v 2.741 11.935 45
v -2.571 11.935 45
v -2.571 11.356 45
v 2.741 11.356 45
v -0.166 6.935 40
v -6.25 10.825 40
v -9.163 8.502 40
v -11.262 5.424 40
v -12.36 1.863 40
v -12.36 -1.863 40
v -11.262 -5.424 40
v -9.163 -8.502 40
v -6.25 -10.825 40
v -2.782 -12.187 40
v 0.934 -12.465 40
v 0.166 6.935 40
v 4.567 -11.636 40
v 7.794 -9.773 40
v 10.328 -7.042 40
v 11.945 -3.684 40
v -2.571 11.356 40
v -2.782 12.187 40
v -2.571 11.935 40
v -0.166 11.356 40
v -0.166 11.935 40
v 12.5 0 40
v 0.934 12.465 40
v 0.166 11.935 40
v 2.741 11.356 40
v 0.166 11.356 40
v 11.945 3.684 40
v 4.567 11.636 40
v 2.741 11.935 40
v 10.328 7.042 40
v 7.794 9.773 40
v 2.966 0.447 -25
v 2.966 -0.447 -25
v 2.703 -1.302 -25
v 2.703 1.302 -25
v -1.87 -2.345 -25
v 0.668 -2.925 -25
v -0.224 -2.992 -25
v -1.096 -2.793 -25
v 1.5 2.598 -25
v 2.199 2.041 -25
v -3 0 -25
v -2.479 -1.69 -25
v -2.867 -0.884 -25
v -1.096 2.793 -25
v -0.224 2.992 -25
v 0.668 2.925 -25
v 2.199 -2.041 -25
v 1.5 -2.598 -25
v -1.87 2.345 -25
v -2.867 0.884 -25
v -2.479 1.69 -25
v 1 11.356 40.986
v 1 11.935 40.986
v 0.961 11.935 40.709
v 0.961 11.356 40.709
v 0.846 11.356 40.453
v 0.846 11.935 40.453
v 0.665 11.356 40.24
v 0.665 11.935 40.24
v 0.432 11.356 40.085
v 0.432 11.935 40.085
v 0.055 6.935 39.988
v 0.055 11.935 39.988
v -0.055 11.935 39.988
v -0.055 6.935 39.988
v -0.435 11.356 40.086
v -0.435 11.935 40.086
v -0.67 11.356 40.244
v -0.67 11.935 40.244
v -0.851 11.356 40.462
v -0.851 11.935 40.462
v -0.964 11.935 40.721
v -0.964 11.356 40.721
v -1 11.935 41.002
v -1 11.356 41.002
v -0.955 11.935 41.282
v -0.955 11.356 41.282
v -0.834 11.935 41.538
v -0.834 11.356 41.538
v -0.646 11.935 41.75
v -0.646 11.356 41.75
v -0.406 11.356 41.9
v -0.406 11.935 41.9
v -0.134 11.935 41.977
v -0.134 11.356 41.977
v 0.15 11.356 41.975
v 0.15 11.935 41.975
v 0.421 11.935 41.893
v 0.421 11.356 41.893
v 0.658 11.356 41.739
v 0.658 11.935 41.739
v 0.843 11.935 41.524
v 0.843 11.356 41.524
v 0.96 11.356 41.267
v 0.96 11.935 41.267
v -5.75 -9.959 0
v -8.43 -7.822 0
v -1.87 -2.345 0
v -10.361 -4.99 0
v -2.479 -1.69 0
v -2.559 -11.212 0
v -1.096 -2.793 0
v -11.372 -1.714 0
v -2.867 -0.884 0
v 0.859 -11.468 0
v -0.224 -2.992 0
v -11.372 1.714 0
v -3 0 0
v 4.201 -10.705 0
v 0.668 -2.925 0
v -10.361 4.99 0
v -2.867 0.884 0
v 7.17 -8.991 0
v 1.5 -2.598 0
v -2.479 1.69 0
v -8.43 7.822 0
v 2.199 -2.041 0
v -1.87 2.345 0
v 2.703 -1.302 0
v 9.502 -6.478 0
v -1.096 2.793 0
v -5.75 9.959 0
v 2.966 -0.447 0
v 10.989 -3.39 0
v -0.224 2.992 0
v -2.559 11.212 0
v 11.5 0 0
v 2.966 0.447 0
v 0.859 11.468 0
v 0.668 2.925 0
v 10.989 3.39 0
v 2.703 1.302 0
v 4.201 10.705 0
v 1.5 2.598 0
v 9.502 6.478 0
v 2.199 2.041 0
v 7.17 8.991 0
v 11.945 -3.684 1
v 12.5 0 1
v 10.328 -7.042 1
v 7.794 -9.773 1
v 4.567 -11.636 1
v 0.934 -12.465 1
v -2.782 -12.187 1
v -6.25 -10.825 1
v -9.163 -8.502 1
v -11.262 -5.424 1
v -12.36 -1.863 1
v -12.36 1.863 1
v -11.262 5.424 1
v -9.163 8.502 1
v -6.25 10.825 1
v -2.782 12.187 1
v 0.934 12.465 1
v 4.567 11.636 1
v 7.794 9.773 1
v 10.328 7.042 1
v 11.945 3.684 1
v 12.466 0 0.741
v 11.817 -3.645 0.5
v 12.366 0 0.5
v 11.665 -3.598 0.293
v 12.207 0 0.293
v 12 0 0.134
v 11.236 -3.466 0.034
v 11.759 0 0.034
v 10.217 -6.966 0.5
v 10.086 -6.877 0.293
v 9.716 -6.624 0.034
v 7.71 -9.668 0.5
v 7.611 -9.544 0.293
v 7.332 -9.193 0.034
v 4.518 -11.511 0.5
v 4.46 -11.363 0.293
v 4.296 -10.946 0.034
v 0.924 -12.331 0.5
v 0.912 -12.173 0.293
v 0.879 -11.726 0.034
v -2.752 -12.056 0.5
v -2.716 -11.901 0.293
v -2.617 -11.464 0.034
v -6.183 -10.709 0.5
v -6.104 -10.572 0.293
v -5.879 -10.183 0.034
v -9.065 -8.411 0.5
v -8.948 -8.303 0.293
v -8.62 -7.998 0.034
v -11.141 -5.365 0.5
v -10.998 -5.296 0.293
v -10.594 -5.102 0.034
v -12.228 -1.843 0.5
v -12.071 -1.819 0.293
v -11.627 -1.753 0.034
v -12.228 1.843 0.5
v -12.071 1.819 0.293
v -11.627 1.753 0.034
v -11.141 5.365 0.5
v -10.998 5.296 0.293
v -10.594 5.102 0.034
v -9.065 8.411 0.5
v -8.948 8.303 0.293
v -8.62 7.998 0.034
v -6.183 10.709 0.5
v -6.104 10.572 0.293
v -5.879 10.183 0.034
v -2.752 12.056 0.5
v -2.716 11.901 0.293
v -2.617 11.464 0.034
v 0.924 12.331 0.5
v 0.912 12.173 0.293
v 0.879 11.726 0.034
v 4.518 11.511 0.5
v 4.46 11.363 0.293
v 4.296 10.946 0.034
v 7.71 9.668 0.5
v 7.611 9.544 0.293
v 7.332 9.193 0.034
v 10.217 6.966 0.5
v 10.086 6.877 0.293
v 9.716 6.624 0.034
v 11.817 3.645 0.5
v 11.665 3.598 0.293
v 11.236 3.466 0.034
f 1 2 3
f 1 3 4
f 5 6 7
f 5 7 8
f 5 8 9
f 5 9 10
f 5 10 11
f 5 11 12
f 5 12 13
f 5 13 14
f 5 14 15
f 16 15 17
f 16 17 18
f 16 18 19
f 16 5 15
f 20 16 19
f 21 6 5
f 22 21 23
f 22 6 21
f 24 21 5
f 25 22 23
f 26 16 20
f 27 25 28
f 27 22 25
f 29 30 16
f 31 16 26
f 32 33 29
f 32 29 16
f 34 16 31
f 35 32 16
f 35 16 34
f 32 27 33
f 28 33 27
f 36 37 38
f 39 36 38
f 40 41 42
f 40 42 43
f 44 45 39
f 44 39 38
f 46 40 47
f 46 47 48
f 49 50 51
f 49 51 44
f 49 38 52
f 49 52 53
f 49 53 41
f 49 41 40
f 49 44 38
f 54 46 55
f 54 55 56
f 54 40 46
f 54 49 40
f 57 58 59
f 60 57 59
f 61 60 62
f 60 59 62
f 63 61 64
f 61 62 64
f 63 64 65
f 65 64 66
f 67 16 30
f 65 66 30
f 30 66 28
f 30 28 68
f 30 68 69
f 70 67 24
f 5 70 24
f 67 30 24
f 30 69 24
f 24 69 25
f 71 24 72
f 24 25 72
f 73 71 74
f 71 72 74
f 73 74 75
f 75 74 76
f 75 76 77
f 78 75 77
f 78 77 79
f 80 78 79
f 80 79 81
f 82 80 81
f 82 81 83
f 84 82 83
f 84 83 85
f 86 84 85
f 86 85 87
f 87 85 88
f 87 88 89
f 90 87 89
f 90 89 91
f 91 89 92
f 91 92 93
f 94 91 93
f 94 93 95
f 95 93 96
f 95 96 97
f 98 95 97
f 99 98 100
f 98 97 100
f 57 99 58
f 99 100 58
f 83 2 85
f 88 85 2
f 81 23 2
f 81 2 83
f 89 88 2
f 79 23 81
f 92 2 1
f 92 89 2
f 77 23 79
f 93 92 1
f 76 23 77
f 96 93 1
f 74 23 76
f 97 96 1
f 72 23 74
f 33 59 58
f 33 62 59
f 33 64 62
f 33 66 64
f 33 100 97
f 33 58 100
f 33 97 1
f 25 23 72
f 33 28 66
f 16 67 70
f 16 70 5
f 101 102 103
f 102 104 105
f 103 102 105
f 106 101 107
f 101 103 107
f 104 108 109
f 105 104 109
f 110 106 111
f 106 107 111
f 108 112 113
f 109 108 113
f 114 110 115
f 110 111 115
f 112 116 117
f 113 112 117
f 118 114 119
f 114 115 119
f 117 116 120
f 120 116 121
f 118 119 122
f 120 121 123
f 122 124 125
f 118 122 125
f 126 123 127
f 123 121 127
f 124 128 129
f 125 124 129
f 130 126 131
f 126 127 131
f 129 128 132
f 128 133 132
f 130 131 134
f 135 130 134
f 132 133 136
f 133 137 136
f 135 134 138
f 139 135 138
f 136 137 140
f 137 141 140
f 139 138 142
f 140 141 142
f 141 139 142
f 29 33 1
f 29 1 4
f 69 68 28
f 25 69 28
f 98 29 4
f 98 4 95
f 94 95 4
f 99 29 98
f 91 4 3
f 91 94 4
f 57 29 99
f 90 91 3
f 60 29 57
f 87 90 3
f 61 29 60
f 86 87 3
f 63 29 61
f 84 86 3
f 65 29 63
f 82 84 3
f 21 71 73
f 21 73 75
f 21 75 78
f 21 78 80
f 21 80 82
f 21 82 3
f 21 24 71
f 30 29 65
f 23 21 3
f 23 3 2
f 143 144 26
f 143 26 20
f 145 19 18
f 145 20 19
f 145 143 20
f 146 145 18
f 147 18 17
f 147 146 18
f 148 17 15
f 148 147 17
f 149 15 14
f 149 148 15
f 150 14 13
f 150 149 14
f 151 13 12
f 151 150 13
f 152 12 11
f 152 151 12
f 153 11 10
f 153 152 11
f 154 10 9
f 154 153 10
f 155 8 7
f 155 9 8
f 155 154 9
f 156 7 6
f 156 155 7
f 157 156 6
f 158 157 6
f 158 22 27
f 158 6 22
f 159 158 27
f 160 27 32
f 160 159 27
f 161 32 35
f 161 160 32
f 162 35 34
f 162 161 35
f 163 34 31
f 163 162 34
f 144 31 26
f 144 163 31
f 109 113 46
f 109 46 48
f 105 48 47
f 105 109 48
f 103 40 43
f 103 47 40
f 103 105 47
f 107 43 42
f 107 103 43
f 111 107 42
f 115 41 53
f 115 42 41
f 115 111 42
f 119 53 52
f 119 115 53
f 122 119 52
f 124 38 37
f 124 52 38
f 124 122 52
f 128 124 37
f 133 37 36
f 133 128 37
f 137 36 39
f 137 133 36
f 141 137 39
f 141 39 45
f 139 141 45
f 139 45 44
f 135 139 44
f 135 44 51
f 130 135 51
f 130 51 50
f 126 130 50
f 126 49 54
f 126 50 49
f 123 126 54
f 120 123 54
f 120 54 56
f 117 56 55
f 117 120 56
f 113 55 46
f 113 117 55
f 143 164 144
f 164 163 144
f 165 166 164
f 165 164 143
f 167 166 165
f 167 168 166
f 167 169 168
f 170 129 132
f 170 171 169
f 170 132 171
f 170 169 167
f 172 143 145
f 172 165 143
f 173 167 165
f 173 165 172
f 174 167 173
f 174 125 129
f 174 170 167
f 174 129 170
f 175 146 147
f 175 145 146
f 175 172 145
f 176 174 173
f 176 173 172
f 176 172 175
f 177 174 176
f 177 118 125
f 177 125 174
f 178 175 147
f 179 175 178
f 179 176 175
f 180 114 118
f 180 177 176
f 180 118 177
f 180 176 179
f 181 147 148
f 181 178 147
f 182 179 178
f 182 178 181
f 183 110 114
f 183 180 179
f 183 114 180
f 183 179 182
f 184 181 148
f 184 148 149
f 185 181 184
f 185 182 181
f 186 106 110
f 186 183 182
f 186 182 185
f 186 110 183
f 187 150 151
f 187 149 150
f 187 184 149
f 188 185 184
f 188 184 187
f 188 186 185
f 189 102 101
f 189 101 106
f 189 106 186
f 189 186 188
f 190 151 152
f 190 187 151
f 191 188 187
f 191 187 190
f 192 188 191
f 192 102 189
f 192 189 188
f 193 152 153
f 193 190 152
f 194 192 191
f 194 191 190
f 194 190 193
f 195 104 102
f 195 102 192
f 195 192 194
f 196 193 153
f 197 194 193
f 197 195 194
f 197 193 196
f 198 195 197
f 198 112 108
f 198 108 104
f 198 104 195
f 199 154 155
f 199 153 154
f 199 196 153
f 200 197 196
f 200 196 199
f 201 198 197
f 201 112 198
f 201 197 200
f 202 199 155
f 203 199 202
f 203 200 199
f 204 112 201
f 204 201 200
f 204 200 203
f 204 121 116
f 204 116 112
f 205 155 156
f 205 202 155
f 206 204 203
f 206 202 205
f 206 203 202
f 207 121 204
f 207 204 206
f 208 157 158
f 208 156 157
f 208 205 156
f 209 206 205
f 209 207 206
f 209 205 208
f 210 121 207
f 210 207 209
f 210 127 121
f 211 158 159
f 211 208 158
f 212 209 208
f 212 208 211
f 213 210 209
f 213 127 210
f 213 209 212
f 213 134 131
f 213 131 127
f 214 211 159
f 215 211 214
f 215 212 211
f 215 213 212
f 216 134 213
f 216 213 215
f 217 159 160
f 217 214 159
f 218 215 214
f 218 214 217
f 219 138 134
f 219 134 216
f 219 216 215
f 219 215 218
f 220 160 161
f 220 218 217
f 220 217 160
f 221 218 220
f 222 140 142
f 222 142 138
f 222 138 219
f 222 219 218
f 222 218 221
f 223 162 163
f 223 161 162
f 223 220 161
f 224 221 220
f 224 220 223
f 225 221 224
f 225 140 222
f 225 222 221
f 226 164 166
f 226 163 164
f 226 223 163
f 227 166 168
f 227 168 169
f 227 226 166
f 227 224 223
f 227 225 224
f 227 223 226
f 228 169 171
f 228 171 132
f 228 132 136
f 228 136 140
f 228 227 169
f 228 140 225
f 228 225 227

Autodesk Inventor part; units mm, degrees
ref_plane "YZ Plane" through (0, 0, 0) normal (1, 0, 0) x (0, 1, 0)
ref_plane "XZ Plane" through (0, 0, 0) normal (0, 1, 0) x (-1, 0, 0)
ref_plane "XY Plane" through (0, 0, 0) normal (0, 0, 1) x (1, 0, 0)
sketch "Sketch1" plane through (0, 0, 0) normal (0, 0, 1) x (1, 0, 0)
  circle A0 centre (0, 0) radius 12.5
  dimension "d0" = 25
extrude "Extrusion1" add sketch "Sketch1" along normal blind 40
sketch "Sketch2" plane through (0, 0, 40) normal (0, 0, 1) x (1, 0, 0)
  point P0 (0, 0)
sketch "Sketch3" plane through (0, 0, 40) normal (0, 0, 1) x (1, 0, 0)
  line L0 (-2.5708, 11.9347) -> (2.7411, 11.9347)
  line L1 (2.7411, 11.9347) -> (2.7411, 11.3559)
  line L2 (2.7411, 11.3559) -> (-2.5708, 11.3559)
  line L3 (-2.5708, 11.3559) -> (-2.5708, 11.9347)
  point P0 (0, 0)
extrude "Extrusion2" add sketch "Sketch3" along normal blind 5
sketch "Sketch5" plane through (-2.5708, 11.9347, 40) normal (0, 1, 0) x (1, 0, 0)
  circle A0 centre (2.5708, -0.9862) radius 1
  point P0 (2.5708, 40)
  dimension "d9" = 2
extrude "Extrusion4" cut sketch "Sketch5" against normal blind 5
sketch "Sketch6" plane through (0, 0, 0) normal (0, 0, -1) x (-1, 0, 0)
  circle A0 centre (0, 0) radius 3
extrude "Extrusion5" add sketch "Sketch6" along normal blind 25
fillet "Fillet1" radius 1 1 edges at (-12.5, 0, 0)
sketch "Sketch7" plane through (-2.5708, 11.9347, 45) normal (0, 1, 0) x (1, 0, 0)
  point P0 (2.5708, 45)
properties part number "DC MOTOR" material "Iron, Gray"
